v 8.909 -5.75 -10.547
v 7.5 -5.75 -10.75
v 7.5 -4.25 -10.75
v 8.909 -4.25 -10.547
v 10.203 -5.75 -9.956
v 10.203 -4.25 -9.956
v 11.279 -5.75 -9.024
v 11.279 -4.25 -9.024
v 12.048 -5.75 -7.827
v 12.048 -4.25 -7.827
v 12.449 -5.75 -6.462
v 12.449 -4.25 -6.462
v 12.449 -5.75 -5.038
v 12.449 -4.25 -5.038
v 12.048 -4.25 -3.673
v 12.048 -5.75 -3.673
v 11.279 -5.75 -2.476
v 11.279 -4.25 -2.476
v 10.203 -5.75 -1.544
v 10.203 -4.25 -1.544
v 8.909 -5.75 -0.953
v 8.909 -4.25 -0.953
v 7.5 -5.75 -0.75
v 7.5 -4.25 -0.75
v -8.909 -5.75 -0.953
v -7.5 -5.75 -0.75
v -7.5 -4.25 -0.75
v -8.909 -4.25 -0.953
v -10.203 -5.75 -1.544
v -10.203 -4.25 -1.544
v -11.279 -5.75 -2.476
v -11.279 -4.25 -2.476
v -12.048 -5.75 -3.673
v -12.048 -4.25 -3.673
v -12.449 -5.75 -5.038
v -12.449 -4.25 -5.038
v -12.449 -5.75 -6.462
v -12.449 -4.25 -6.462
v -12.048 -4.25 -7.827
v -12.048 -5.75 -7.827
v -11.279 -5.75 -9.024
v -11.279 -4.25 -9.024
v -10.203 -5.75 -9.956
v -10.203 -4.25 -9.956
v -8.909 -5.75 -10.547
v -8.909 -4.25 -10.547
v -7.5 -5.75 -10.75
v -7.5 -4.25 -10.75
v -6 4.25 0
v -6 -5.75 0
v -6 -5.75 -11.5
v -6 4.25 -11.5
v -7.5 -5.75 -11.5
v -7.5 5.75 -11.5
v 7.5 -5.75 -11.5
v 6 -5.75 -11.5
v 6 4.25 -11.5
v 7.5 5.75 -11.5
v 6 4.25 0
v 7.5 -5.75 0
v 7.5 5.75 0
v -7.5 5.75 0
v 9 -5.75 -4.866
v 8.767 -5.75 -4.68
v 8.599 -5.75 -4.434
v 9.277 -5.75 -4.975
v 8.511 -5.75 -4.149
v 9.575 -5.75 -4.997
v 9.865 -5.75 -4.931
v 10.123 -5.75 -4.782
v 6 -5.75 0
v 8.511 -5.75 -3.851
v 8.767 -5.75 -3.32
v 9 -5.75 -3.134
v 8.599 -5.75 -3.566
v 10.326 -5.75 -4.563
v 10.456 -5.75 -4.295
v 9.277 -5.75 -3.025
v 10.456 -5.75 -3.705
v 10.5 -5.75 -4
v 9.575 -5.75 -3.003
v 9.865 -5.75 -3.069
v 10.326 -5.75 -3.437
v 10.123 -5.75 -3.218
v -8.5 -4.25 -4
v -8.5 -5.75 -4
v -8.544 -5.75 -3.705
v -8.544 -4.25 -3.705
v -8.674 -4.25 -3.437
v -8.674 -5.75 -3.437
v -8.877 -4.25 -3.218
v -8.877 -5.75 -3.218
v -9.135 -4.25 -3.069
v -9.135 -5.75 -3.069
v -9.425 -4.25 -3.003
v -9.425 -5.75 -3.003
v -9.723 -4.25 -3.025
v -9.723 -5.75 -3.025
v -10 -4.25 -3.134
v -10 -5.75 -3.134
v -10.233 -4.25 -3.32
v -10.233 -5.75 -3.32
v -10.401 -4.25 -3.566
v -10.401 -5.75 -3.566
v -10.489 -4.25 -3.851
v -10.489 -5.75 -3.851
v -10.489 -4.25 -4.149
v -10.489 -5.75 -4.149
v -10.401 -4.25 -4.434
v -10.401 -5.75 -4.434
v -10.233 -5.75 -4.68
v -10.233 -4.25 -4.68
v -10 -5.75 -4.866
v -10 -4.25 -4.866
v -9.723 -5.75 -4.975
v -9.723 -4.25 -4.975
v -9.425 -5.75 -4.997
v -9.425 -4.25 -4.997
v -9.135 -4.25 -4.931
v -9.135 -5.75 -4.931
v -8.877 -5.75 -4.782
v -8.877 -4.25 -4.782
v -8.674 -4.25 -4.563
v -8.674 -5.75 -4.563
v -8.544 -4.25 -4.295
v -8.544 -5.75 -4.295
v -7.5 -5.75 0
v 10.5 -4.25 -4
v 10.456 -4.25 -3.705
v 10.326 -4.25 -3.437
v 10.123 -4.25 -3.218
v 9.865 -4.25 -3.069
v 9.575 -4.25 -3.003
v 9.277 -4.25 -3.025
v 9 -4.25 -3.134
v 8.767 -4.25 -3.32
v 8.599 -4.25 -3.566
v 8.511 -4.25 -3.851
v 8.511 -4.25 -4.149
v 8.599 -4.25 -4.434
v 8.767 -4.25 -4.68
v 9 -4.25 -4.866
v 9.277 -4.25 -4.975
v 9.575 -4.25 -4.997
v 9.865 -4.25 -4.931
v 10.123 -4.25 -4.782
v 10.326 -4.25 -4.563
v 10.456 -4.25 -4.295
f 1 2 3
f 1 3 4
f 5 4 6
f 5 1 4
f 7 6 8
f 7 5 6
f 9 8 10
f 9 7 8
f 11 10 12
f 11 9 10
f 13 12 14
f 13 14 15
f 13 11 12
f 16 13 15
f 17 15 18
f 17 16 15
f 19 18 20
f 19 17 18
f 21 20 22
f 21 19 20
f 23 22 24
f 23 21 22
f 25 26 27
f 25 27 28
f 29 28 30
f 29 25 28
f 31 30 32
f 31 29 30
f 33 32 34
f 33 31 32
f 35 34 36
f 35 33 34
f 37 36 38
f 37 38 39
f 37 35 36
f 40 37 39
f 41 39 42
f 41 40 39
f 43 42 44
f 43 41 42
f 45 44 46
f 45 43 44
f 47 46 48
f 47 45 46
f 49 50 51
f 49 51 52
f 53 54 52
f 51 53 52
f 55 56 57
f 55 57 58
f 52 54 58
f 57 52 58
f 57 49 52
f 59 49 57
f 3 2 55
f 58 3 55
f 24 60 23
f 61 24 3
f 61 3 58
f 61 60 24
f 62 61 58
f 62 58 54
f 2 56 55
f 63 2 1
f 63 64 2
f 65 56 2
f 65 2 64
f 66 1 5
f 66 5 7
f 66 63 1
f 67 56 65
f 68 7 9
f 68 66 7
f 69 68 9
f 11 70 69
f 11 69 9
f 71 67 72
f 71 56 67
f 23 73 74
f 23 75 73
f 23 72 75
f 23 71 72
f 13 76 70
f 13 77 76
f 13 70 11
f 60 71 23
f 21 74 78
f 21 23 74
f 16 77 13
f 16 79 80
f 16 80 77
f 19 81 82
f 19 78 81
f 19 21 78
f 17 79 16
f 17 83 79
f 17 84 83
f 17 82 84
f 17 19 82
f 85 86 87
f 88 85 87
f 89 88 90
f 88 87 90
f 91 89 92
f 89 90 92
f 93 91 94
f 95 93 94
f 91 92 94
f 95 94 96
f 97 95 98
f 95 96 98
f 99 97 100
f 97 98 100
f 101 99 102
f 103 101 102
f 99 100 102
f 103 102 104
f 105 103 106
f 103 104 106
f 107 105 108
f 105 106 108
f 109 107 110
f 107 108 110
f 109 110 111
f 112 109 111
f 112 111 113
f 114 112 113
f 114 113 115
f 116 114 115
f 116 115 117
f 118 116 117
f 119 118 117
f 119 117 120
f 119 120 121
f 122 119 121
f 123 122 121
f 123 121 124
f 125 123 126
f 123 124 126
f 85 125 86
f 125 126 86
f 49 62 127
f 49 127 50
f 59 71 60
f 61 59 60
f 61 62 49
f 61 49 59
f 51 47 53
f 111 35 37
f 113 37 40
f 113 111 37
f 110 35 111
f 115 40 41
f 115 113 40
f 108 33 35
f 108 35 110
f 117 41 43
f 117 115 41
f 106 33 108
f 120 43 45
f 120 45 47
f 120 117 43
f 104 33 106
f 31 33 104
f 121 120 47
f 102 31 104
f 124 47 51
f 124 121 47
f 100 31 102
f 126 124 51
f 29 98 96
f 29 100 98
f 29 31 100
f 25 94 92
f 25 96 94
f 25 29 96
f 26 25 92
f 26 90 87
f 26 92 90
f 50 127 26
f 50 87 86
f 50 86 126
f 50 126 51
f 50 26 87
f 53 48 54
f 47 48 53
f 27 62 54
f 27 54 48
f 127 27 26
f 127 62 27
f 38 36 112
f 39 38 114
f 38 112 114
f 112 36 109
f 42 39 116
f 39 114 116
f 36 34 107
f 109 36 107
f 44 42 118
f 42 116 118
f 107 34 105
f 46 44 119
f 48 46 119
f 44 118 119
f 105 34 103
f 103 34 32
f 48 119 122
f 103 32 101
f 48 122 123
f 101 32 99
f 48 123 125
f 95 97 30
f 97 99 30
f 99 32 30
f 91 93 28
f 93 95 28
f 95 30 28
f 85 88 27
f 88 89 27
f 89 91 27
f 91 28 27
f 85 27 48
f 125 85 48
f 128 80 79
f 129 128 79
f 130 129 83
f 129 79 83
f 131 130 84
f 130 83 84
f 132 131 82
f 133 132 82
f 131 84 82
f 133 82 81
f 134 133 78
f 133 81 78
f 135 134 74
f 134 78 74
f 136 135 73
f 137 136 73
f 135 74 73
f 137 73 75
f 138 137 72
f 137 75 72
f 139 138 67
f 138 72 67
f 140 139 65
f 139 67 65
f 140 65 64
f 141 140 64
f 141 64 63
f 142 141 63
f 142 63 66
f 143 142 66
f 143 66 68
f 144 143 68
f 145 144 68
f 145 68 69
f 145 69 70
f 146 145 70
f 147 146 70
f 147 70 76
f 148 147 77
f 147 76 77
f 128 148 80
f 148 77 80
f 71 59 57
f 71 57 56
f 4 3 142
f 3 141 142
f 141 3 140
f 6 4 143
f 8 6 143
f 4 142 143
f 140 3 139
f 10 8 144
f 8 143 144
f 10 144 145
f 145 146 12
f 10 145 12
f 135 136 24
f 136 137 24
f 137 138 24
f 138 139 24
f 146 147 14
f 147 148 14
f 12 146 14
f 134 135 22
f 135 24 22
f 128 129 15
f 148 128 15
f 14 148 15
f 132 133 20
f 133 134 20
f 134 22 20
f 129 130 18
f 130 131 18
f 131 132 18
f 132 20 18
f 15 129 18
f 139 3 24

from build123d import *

# Parameters (mm, degrees)
BOSS_EXTRUDE1_DEPTH = 11.5
SKETCH2_R           = 1
BOSS_EXTRUDE2_DEPTH = 1.5


with BuildPart() as part:
    # Sketch1 → Boss-Extrude1 (new body)
    with BuildSketch(Plane.XY):
        Polygon((7.5, 5.75), (-7.5, 5.75), (-7.5, -5.75), (-6, -5.75), (-6, 4.25), (6, 4.25), (6, -5.75), (7.5, -5.75), align=None)
    extrude(amount=-BOSS_EXTRUDE1_DEPTH)

    # Sketch2 → Boss-Extrude2 (add)
    with BuildSketch(Plane.XZ.offset(5.75)):
        with BuildLine():
            Line((-7.5, -10.75), (-7.5, -0.75))
            ThreePointArc((-7.5, -0.75), (-12.5, -5.75), (-7.5, -10.75))
        make_face()
        with Locations((-9.5, -4)):
            Circle(SKETCH2_R, mode=Mode.SUBTRACT)
        with BuildLine():
            Line((7.5, -0.75), (7.5, -10.75))
            ThreePointArc((7.5, -10.75), (12.5, -5.75), (7.5, -0.75))
        make_face()
        with Locations((9.5, -4)):
            Circle(SKETCH2_R, mode=Mode.SUBTRACT)
    extrude(amount=-BOSS_EXTRUDE2_DEPTH)


solid = part.part
